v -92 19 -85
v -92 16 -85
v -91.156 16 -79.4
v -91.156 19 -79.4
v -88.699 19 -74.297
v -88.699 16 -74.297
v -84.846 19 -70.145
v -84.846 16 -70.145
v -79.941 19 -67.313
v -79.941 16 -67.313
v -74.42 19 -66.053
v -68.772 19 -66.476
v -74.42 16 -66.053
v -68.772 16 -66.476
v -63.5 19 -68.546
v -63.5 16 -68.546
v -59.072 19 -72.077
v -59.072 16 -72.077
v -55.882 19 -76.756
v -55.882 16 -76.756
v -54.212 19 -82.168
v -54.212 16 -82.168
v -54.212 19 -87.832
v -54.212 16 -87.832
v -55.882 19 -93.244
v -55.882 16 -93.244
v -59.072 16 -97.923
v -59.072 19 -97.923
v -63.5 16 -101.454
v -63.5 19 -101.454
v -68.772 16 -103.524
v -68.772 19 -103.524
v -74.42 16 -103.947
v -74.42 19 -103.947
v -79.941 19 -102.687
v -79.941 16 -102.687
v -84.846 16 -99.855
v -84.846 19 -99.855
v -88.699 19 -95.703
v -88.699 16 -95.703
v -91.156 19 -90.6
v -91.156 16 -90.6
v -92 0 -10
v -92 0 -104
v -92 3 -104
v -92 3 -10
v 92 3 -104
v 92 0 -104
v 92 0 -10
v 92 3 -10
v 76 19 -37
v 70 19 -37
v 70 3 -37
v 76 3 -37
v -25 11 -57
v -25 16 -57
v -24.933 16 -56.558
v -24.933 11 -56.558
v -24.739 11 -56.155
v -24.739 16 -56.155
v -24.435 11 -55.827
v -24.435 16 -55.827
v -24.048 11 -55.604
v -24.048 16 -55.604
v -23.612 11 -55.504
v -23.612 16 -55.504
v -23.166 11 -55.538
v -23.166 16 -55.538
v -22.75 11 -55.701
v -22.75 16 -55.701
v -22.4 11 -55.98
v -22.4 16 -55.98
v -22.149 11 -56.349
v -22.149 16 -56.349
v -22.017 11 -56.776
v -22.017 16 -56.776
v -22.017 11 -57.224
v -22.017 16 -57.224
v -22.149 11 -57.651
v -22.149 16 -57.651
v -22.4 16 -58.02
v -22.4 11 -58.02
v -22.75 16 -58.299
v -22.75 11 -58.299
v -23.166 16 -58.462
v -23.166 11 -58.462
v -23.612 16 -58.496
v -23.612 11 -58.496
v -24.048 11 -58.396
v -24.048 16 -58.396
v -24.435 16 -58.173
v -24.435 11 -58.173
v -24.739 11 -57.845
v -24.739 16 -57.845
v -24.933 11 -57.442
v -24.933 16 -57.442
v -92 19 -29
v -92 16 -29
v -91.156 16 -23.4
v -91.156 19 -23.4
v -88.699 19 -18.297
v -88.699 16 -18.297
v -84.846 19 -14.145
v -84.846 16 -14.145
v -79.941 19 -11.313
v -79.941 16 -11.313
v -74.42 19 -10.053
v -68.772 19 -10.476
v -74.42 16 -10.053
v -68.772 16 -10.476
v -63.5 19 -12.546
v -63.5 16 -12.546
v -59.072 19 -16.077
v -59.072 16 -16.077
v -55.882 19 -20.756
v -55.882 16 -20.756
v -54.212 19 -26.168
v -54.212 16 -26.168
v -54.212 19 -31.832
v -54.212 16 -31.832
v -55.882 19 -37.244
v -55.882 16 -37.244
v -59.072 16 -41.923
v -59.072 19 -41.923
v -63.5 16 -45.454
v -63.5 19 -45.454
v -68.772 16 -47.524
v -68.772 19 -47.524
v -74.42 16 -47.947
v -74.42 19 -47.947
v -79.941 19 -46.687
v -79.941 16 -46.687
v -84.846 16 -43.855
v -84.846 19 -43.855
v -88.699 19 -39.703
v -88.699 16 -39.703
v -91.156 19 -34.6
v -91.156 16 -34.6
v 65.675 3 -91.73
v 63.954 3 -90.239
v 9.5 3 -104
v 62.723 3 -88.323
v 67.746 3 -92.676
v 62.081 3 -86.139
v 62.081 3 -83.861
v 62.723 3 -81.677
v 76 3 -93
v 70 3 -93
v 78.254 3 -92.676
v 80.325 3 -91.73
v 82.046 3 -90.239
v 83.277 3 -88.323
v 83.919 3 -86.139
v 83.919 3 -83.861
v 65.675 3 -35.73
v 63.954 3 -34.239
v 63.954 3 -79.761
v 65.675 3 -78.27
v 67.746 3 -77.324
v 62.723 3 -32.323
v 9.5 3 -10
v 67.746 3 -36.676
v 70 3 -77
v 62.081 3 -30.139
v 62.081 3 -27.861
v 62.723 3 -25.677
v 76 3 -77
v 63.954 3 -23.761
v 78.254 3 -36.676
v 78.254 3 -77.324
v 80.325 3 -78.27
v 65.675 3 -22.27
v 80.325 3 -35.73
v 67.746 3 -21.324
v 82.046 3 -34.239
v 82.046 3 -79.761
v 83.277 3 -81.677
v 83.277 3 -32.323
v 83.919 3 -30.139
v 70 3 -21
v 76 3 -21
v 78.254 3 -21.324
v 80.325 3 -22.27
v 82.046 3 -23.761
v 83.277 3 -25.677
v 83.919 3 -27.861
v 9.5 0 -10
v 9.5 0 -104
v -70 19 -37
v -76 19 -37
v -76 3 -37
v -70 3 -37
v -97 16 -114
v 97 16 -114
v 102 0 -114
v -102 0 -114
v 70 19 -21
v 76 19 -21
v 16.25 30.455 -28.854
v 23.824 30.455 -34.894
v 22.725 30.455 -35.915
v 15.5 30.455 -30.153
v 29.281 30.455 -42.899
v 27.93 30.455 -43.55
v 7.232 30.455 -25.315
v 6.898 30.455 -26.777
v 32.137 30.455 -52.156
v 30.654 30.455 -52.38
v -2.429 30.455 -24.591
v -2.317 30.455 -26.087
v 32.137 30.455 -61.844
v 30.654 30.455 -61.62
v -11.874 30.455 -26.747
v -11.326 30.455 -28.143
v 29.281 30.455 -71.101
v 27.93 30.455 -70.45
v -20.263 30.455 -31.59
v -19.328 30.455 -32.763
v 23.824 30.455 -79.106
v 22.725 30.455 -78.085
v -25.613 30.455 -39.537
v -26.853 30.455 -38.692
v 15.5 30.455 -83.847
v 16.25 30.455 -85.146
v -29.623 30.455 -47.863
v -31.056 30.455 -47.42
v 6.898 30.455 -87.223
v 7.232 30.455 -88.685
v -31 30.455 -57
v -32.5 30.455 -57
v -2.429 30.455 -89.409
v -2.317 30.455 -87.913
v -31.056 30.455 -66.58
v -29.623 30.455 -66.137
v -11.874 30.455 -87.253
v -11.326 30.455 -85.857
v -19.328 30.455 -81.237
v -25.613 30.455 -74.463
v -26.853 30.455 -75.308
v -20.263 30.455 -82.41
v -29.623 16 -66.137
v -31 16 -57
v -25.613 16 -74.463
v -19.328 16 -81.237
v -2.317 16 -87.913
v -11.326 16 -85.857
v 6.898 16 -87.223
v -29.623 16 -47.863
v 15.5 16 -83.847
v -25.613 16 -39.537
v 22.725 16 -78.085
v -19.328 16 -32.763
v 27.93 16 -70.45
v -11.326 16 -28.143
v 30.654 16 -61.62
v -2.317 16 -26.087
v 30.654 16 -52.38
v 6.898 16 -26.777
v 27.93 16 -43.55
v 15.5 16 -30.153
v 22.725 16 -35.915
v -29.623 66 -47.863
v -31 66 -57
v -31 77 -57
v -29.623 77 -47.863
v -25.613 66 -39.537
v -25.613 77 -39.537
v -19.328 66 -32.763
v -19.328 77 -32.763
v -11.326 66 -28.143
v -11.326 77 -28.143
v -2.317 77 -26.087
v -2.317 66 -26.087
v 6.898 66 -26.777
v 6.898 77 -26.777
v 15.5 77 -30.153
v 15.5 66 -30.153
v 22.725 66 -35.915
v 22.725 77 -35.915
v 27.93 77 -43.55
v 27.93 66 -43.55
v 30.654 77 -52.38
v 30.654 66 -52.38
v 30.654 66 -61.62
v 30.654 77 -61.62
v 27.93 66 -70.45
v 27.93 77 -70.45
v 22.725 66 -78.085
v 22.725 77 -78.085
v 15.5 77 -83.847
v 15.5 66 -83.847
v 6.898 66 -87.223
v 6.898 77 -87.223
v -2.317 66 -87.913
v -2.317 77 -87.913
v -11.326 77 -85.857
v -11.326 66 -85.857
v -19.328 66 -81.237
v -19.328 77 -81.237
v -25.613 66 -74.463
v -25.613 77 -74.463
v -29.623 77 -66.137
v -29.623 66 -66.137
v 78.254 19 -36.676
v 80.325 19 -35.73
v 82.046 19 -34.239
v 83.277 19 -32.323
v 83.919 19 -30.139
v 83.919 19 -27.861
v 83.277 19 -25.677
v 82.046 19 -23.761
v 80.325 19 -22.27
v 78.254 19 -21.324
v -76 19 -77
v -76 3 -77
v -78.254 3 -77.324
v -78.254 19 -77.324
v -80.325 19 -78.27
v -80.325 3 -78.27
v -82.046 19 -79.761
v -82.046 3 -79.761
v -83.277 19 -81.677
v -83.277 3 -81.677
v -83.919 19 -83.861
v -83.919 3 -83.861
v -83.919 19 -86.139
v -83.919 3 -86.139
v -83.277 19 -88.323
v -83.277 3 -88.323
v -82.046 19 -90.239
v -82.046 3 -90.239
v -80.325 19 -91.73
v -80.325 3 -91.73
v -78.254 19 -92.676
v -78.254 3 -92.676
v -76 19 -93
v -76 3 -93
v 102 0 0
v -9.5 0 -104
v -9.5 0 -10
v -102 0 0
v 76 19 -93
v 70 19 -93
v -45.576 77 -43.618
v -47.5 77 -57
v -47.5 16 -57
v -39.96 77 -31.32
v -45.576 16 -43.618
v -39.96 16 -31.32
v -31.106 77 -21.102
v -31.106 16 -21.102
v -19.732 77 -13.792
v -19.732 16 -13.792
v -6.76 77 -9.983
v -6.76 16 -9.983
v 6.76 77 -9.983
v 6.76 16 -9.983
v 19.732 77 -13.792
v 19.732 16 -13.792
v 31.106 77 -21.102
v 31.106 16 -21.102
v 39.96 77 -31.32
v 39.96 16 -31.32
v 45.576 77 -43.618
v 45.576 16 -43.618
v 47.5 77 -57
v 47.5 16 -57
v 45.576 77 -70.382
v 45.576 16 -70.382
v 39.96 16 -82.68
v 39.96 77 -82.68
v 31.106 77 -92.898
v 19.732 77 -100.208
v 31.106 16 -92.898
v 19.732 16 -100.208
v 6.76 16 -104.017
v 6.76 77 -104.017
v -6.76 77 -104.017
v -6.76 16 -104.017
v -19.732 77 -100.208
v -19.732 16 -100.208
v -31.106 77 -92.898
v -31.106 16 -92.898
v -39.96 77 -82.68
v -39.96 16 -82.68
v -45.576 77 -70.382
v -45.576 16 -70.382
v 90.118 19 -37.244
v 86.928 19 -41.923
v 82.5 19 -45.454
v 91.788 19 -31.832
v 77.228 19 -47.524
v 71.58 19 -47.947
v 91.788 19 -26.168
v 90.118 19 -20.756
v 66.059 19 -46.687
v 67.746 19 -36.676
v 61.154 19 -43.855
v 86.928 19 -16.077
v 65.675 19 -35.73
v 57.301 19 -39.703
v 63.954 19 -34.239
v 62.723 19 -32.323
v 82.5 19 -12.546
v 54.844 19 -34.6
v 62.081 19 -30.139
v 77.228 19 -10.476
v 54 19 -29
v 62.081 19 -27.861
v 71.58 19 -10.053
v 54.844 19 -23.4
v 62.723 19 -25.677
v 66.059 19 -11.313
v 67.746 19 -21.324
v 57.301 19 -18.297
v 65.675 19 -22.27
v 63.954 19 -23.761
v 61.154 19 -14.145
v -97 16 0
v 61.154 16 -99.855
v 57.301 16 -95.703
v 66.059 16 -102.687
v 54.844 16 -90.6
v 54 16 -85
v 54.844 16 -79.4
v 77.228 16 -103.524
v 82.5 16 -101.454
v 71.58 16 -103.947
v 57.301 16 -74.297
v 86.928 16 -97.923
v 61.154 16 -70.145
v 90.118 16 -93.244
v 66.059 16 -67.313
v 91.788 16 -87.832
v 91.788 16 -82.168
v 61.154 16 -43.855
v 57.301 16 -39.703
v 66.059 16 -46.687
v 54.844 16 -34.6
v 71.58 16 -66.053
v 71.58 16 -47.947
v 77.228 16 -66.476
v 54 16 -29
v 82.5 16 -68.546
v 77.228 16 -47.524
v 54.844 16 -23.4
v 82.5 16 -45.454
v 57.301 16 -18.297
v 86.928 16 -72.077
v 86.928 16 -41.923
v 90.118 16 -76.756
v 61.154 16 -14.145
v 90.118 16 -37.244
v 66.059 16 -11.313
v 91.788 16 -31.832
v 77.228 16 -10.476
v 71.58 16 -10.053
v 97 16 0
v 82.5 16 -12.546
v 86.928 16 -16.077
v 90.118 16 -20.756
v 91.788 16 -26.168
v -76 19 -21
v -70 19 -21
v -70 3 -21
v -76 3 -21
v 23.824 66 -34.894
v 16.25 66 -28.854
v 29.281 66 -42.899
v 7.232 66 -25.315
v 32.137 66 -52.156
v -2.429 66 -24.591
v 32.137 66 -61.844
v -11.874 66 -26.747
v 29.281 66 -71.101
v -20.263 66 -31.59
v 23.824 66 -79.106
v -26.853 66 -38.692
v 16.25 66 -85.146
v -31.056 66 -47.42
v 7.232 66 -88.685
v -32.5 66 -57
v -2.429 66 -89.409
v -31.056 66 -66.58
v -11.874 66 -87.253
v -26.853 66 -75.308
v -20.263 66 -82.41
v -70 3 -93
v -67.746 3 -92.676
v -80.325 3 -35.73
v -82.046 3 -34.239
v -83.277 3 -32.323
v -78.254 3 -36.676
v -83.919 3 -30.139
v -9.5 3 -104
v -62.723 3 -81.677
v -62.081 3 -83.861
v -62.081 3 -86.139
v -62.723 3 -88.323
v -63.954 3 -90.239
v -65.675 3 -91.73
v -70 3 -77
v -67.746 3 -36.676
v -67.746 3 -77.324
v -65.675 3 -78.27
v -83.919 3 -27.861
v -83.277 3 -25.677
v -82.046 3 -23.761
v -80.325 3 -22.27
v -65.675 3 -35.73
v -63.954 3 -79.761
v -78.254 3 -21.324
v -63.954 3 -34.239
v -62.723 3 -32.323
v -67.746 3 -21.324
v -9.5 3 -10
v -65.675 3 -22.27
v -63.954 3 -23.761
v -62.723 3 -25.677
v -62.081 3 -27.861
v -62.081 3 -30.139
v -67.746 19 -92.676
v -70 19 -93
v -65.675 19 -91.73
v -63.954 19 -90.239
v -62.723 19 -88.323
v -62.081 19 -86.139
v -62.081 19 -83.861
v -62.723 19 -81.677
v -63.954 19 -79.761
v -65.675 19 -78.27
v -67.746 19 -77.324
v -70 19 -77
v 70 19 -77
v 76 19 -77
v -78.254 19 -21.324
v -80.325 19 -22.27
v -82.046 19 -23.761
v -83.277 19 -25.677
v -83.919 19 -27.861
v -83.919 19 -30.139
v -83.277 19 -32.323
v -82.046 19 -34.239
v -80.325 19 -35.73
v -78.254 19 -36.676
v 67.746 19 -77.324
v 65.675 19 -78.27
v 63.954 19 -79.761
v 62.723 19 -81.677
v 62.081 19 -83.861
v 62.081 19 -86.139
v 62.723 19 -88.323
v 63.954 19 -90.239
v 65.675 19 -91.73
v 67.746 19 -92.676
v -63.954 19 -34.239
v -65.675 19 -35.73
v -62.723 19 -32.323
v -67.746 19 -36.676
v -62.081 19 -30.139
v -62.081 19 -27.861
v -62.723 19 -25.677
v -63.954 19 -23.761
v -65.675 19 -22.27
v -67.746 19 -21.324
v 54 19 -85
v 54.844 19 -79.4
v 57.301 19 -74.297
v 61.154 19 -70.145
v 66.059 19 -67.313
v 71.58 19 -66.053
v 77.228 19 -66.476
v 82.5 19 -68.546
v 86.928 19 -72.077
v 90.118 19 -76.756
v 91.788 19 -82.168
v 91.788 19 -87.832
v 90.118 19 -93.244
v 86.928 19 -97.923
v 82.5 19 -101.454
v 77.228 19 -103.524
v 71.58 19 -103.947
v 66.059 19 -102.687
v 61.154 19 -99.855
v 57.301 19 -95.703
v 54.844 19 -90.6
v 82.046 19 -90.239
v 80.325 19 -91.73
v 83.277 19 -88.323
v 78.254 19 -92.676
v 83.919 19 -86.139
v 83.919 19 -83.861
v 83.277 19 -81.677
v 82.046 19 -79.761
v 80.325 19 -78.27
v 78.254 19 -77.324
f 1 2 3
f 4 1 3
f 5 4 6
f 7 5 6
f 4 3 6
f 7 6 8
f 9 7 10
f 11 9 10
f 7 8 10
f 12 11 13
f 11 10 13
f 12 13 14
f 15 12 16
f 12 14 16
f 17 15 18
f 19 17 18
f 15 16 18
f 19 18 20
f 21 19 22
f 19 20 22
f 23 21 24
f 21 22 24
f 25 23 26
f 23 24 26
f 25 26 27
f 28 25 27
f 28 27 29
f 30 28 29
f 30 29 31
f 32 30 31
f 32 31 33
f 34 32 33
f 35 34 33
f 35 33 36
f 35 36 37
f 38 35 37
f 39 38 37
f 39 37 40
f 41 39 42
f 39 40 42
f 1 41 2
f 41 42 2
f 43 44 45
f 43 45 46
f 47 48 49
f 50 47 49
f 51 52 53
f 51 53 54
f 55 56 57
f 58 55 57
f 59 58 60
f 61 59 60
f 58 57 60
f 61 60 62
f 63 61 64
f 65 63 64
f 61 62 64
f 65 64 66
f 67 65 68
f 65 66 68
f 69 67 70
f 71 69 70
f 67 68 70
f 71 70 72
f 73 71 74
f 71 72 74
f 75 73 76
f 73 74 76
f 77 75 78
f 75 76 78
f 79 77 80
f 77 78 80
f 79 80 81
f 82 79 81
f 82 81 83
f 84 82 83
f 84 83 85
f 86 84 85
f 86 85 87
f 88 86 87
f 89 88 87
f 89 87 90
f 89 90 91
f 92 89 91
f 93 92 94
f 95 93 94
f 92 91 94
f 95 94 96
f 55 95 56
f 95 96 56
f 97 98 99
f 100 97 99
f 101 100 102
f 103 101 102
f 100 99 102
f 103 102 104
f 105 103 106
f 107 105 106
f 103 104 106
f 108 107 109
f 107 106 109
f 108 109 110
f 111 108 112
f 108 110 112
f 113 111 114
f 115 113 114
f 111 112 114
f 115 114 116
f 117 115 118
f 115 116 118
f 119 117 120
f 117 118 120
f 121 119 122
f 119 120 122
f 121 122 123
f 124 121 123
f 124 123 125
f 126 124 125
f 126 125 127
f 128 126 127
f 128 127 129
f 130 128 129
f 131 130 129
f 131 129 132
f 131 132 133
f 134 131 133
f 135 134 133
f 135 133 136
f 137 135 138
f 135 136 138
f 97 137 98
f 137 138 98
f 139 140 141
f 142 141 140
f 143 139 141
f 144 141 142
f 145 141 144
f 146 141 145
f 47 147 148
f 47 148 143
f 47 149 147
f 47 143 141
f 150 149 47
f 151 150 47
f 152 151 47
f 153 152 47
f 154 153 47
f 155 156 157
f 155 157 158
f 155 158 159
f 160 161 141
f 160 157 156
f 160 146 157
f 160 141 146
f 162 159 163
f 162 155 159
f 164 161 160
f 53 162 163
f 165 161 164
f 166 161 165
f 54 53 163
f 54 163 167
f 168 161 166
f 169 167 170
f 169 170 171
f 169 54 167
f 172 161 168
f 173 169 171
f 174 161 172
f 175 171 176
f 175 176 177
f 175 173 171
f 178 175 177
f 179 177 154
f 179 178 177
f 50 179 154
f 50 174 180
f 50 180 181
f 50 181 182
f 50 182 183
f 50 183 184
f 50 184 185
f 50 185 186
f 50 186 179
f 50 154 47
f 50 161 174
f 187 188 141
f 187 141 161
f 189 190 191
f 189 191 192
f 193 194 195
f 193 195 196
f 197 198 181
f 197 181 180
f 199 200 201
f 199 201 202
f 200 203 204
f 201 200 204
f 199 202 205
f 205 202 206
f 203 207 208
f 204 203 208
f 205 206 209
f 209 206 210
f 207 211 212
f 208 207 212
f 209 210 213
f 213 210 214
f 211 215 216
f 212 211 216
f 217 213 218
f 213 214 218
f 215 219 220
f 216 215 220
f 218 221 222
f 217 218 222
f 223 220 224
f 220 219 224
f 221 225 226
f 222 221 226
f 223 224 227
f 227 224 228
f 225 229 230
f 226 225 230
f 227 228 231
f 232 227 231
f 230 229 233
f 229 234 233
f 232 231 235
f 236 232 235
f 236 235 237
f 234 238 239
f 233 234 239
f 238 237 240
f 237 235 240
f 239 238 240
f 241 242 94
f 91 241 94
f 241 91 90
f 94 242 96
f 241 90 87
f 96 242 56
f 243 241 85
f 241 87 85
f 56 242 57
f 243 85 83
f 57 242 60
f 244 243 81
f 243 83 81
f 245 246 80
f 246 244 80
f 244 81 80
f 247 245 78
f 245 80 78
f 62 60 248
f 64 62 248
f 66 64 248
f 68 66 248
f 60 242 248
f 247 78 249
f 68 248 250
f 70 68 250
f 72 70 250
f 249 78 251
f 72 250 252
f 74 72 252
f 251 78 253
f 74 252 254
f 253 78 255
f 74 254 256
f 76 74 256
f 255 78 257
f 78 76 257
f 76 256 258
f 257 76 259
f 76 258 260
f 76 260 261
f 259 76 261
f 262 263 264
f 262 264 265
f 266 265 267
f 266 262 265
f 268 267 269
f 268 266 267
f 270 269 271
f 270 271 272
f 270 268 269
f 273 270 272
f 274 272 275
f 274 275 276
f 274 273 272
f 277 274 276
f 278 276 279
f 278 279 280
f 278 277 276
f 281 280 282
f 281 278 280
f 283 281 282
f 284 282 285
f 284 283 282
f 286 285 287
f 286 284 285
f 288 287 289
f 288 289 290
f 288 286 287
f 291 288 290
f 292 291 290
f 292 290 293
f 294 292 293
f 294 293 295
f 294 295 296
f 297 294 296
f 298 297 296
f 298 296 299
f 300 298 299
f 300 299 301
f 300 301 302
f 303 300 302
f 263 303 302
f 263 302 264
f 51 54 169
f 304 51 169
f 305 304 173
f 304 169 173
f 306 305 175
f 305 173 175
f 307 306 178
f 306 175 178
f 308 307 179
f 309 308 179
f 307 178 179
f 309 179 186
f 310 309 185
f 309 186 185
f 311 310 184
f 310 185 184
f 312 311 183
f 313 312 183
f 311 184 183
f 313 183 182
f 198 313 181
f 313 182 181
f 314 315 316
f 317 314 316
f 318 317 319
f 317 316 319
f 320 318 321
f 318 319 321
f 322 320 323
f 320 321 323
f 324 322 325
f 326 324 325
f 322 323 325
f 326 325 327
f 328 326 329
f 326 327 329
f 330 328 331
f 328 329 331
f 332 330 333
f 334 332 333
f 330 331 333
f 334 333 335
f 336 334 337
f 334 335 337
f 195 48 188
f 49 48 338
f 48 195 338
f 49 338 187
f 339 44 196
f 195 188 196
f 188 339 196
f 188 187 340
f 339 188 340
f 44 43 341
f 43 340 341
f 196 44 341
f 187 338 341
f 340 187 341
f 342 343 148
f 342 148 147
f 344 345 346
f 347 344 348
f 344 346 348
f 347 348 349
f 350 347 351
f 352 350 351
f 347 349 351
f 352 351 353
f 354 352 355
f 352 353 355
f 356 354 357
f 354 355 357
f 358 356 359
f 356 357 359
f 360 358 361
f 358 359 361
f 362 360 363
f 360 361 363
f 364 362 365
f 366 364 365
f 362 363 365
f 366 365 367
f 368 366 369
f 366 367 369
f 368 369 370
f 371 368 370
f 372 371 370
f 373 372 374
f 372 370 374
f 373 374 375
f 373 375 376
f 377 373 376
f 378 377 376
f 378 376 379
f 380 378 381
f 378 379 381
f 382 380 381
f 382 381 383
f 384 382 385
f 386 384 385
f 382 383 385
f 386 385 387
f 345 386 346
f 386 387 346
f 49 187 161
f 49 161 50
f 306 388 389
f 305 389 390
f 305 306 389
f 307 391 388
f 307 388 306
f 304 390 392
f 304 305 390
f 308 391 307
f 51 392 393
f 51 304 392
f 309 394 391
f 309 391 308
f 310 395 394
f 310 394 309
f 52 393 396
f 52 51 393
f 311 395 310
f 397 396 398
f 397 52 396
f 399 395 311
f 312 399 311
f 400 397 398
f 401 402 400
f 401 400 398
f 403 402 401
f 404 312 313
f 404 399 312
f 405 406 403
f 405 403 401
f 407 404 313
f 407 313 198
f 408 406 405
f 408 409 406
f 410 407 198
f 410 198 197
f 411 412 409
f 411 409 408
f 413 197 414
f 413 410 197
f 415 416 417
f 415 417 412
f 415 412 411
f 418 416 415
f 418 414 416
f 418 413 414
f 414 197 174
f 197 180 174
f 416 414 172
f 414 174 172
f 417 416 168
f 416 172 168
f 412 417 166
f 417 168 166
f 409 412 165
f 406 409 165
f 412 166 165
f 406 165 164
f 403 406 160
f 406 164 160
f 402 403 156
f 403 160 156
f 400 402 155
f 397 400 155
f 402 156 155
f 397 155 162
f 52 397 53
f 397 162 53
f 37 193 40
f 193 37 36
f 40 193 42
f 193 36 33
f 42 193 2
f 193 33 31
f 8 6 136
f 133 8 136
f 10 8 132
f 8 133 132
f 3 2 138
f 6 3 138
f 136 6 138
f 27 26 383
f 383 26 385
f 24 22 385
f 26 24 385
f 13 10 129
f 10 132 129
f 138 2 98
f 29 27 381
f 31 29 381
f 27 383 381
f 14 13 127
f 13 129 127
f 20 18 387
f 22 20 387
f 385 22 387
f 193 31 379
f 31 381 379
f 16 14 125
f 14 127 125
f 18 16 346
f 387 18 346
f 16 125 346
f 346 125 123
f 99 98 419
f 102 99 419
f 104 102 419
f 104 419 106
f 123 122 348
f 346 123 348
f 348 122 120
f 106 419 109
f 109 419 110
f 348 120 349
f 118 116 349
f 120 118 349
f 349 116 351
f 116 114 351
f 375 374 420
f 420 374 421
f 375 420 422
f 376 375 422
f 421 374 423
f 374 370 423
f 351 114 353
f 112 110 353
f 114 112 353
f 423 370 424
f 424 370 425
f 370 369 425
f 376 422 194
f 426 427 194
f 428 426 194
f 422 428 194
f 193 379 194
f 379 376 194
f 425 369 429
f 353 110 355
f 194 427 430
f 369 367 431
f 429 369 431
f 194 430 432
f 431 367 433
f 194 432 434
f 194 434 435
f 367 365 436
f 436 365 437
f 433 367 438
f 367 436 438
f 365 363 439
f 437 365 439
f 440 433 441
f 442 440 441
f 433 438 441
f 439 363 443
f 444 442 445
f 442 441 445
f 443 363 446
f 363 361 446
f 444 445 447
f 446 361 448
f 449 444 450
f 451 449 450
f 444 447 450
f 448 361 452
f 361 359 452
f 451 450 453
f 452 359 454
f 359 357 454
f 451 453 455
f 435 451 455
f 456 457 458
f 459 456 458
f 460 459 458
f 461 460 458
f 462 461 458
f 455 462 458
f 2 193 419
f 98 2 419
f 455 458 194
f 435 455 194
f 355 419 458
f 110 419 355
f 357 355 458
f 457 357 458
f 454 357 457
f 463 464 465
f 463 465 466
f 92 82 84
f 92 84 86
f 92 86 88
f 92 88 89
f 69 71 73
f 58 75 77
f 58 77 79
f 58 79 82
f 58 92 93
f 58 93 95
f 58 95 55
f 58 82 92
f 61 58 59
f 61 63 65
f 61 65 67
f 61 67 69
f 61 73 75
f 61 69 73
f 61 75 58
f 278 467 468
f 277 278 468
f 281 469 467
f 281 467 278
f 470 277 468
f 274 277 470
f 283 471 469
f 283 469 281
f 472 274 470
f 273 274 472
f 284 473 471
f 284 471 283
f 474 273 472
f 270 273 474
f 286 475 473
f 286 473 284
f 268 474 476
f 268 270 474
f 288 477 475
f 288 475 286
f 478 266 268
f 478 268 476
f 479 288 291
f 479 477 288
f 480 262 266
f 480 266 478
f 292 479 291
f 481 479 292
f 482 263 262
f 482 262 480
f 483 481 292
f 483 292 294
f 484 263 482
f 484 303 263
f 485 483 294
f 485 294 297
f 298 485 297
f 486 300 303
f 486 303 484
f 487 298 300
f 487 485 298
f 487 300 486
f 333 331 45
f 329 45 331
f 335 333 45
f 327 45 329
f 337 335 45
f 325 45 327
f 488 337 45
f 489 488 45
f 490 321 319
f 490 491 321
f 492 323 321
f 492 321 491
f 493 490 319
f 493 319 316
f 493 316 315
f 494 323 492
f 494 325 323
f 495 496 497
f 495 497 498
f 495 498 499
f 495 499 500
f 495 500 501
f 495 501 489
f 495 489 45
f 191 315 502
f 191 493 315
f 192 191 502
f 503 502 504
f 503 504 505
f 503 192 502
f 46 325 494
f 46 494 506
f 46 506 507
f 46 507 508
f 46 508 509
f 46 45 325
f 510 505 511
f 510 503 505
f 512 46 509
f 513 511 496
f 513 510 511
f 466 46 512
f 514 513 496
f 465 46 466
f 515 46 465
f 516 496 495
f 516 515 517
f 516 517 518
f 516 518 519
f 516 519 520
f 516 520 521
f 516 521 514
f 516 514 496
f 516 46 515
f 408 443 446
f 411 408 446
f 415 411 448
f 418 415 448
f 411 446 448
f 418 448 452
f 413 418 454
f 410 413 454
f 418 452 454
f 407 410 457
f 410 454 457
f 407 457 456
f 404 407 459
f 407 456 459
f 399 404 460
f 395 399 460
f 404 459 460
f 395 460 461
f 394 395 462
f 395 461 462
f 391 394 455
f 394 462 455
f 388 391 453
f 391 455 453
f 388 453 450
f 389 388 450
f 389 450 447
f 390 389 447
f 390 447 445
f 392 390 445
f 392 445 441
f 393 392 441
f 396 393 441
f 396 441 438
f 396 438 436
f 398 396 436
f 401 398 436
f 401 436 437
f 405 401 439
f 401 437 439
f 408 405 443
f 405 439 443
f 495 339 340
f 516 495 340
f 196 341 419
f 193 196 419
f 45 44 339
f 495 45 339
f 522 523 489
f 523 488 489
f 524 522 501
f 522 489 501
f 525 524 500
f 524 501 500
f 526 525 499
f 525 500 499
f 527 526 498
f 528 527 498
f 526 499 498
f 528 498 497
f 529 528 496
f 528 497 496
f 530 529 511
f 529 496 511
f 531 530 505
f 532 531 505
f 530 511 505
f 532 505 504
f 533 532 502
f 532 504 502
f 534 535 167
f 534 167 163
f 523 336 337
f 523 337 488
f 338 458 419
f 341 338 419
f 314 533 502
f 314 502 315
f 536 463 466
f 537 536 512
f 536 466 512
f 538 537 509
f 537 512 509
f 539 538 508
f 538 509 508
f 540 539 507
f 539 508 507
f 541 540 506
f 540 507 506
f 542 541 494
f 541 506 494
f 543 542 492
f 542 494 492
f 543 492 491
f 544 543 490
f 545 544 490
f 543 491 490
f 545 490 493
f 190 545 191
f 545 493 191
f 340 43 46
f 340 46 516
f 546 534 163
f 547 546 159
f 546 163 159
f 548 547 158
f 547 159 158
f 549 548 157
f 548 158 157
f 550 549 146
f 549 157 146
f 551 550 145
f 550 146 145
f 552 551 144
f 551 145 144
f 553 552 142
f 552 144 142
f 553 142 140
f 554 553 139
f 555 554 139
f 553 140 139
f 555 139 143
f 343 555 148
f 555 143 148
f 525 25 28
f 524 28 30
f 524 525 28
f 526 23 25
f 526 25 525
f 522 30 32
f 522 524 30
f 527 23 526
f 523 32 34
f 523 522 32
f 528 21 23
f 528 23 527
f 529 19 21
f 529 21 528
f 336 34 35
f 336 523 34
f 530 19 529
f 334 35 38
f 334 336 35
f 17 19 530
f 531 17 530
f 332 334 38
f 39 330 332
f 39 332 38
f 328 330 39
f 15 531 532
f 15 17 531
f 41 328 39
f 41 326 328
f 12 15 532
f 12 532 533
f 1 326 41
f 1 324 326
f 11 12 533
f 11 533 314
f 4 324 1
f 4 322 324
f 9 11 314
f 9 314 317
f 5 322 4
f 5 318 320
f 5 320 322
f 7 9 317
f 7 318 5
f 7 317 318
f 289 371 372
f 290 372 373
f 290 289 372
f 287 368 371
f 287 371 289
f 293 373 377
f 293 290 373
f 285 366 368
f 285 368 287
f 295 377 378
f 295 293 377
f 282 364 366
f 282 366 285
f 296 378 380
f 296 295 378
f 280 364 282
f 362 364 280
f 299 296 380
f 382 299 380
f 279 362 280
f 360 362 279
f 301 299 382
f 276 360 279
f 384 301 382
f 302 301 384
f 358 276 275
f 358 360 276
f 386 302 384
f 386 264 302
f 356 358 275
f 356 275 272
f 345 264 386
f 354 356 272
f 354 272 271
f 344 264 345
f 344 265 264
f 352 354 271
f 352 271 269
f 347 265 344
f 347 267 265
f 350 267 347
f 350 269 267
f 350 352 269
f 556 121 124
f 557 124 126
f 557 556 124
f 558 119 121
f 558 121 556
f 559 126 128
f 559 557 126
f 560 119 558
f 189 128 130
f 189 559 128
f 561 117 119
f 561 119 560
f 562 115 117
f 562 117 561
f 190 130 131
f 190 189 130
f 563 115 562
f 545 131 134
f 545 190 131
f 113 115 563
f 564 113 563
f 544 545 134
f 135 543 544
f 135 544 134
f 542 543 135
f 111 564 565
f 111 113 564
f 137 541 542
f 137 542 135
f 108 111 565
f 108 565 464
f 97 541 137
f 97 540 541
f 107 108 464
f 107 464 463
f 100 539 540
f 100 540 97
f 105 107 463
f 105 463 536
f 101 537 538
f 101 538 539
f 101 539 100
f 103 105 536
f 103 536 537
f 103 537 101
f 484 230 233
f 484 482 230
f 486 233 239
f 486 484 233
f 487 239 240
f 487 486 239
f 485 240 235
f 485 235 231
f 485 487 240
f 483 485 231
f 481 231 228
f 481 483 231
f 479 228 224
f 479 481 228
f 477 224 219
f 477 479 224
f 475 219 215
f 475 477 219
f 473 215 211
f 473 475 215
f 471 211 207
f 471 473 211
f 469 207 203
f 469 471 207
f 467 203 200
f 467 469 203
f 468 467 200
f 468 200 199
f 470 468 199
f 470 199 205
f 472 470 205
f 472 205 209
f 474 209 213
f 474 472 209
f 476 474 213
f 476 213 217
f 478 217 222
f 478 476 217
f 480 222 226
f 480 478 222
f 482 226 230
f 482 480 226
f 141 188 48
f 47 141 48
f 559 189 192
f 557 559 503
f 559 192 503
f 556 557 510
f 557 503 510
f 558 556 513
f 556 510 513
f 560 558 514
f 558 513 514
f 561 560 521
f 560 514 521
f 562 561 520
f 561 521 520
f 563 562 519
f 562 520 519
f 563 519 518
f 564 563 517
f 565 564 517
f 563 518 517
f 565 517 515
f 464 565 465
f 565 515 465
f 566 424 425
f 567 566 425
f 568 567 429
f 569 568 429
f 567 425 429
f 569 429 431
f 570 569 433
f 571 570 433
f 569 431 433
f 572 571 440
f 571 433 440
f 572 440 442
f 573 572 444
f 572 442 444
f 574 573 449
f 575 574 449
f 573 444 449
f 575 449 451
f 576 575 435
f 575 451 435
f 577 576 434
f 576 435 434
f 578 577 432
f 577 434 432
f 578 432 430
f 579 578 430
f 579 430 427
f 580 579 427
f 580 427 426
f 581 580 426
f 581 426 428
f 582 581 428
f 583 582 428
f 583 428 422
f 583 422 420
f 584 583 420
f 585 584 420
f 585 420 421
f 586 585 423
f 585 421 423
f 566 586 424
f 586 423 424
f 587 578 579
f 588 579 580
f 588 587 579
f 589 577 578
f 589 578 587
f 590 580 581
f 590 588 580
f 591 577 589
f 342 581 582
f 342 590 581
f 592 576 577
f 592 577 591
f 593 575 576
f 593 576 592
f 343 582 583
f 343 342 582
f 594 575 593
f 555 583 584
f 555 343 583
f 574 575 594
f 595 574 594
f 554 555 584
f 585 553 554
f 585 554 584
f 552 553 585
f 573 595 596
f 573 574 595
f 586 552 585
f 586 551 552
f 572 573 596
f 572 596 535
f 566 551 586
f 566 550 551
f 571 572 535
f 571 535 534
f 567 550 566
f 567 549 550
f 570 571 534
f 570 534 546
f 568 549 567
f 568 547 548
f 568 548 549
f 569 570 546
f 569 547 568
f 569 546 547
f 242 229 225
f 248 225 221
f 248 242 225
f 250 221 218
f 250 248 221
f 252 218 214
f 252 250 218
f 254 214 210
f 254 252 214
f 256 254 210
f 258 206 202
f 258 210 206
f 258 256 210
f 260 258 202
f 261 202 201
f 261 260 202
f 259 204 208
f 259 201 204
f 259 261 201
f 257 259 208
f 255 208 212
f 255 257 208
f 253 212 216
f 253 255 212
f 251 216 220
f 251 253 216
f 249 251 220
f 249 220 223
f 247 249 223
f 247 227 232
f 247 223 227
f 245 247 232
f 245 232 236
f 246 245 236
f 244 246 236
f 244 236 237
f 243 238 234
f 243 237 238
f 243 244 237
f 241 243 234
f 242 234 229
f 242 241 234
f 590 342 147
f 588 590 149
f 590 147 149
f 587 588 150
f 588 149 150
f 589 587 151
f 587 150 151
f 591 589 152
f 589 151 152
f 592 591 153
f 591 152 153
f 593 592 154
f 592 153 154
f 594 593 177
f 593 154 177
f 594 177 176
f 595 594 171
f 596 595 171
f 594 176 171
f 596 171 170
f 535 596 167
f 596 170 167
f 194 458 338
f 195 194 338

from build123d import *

# Parameters (mm, degrees)
BOSS_EXTRUDE1_DEPTH = 114
SKETCH3_W           = 82.5
SKETCH3_H           = 94
CUT_EXTRUDE1_DEPTH  = 3
CUT_EXTRUDE2_DEPTH  = 17
SKETCH5_R           = 19
BOSS_EXTRUDE2_DEPTH = 3
SKETCH6_R           = 47.5
SKETCH6_R_2         = 31
BOSS_EXTRUDE4_DEPTH = 61
SKETCH8_W           = 3
SKETCH8_H           = 35.544994967
SKETCH9_R           = 1.5
CUT_EXTRUDE3_DEPTH  = 5


with BuildPart() as part:
    # Sketch2 → Boss-Extrude1 (new body)
    with BuildSketch(Plane.XY):
        Polygon((-102, 0), (-97, 16), (97, 16), (102, 0), align=None)
    extrude(amount=-BOSS_EXTRUDE1_DEPTH)

    # Sketch3 → Cut-Extrude1 (cut)
    with BuildSketch(Plane.XZ):
        with Locations((-50.75, -57)):
            Rectangle(SKETCH3_W, SKETCH3_H)
        with Locations((50.75, -57)):
            Rectangle(SKETCH3_W, SKETCH3_H)
    extrude(amount=-CUT_EXTRUDE1_DEPTH, mode=Mode.SUBTRACT)

    # Sketch4 → Cut-Extrude2 (cut, through all)
    with BuildSketch(Plane(origin=(0, 16, 0), x_dir=(1, 0, 0), z_dir=(0, 1, 0))):
        with BuildLine():
            Line((-76, 77), (-70, 77))
            ThreePointArc((-70, 77), (-62, 85), (-70, 93))
            Line((-70, 93), (-76, 93))
            ThreePointArc((-76, 93), (-84, 85), (-76, 77))
        make_face()
        with BuildLine():
            ThreePointArc((70, 77), (62, 85), (70, 93))
            Line((70, 93), (76, 93))
            ThreePointArc((76, 93), (84, 85), (76, 77))
            Line((76, 77), (70, 77))
        make_face()
        with BuildLine():
            ThreePointArc((-70, 37), (-62, 29), (-70, 21))
            Line((-70, 21), (-76, 21))
            ThreePointArc((-76, 21), (-84, 29), (-76, 37))
            Line((-76, 37), (-70, 37))
        make_face()
        with BuildLine():
            Line((76, 37), (70, 37))
            ThreePointArc((70, 37), (62, 29), (70, 21))
            Line((70, 21), (76, 21))
            ThreePointArc((76, 21), (84, 29), (76, 37))
        make_face()
    extrude(amount=-CUT_EXTRUDE2_DEPTH, mode=Mode.SUBTRACT)

    # Sketch5 → Boss-Extrude2 (add)
    with BuildSketch(Plane(origin=(0, 16, 0), x_dir=(1, 0, 0), z_dir=(0, 1, 0))):
        with Locations(Location((-73, 85, 0), (0, 0, 180))):  # turned: the seam where the file's is
            Circle(SKETCH5_R)
        with BuildLine():
            ThreePointArc((-70, 93), (-62, 85), (-70, 77))
            Line((-70, 77), (-76, 77))
            ThreePointArc((-76, 77), (-84, 85), (-76, 93))
            Line((-76, 93), (-70, 93))
        make_face(mode=Mode.SUBTRACT)
        with Locations(Location((73, 85, 0), (0, 0, 180))):  # turned: the seam where the file's is
            Circle(SKETCH5_R)
        with BuildLine():
            ThreePointArc((76, 93), (84, 85), (76, 77))
            Line((76, 77), (70, 77))
            ThreePointArc((70, 77), (62, 85), (70, 93))
            Line((70, 93), (76, 93))
        make_face(mode=Mode.SUBTRACT)
        with Locations(Location((73, 29, 0), (0, 0, 180))):  # turned: the seam where the file's is
            Circle(SKETCH5_R)
        with BuildLine():
            ThreePointArc((70, 21), (62, 29), (70, 37))
            Line((70, 37), (76, 37))
            ThreePointArc((76, 37), (84, 29), (76, 21))
            Line((76, 21), (70, 21))
        make_face(mode=Mode.SUBTRACT)
        with Locations(Location((-73, 29, 0), (0, 0, 180))):  # turned: the seam where the file's is
            Circle(SKETCH5_R)
        with BuildLine():
            ThreePointArc((-76, 21), (-84, 29), (-76, 37))
            Line((-76, 37), (-70, 37))
            ThreePointArc((-70, 37), (-62, 29), (-70, 21))
            Line((-70, 21), (-76, 21))
        make_face(mode=Mode.SUBTRACT)
    extrude(amount=BOSS_EXTRUDE2_DEPTH)

    # Sketch6 → Boss-Extrude4 (add)
    with BuildSketch(Plane(origin=(0, 16, 0), x_dir=(1, 0, 0), z_dir=(0, 1, 0))):
        with Locations(Location((0, 57, 0), (0, 0, 180))):  # turned: the seam where the file's is
            Circle(SKETCH6_R)
        with Locations(Location((0, 57, 0), (0, 0, 180))):  # turned: the seam where the file's is
            Circle(SKETCH6_R_2, mode=Mode.SUBTRACT)
    extrude(amount=BOSS_EXTRUDE4_DEPTH)

    # Sketch8 → Cut-Revolve1 (revolve, cut)
    with BuildSketch(Plane.XY.offset(-57)):
        with Locations((-31, 48.227502517)):
            Rectangle(SKETCH8_W, SKETCH8_H)
    revolve(axis=Axis((0, 107.106199385, -57), (0, -1, 0)), mode=Mode.SUBTRACT)

    # Sketch9 → Cut-Extrude3 (cut)
    with BuildSketch(Plane(origin=(0, 16, 0), x_dir=(1, 0, 0), z_dir=(0, 1, 0))):
        with Locations(Location((-23.5, 57, 0), (0, 0, 180))):  # turned: the seam where the file's is
            Circle(SKETCH9_R)
    extrude(amount=-CUT_EXTRUDE3_DEPTH, mode=Mode.SUBTRACT)


solid = part.part
